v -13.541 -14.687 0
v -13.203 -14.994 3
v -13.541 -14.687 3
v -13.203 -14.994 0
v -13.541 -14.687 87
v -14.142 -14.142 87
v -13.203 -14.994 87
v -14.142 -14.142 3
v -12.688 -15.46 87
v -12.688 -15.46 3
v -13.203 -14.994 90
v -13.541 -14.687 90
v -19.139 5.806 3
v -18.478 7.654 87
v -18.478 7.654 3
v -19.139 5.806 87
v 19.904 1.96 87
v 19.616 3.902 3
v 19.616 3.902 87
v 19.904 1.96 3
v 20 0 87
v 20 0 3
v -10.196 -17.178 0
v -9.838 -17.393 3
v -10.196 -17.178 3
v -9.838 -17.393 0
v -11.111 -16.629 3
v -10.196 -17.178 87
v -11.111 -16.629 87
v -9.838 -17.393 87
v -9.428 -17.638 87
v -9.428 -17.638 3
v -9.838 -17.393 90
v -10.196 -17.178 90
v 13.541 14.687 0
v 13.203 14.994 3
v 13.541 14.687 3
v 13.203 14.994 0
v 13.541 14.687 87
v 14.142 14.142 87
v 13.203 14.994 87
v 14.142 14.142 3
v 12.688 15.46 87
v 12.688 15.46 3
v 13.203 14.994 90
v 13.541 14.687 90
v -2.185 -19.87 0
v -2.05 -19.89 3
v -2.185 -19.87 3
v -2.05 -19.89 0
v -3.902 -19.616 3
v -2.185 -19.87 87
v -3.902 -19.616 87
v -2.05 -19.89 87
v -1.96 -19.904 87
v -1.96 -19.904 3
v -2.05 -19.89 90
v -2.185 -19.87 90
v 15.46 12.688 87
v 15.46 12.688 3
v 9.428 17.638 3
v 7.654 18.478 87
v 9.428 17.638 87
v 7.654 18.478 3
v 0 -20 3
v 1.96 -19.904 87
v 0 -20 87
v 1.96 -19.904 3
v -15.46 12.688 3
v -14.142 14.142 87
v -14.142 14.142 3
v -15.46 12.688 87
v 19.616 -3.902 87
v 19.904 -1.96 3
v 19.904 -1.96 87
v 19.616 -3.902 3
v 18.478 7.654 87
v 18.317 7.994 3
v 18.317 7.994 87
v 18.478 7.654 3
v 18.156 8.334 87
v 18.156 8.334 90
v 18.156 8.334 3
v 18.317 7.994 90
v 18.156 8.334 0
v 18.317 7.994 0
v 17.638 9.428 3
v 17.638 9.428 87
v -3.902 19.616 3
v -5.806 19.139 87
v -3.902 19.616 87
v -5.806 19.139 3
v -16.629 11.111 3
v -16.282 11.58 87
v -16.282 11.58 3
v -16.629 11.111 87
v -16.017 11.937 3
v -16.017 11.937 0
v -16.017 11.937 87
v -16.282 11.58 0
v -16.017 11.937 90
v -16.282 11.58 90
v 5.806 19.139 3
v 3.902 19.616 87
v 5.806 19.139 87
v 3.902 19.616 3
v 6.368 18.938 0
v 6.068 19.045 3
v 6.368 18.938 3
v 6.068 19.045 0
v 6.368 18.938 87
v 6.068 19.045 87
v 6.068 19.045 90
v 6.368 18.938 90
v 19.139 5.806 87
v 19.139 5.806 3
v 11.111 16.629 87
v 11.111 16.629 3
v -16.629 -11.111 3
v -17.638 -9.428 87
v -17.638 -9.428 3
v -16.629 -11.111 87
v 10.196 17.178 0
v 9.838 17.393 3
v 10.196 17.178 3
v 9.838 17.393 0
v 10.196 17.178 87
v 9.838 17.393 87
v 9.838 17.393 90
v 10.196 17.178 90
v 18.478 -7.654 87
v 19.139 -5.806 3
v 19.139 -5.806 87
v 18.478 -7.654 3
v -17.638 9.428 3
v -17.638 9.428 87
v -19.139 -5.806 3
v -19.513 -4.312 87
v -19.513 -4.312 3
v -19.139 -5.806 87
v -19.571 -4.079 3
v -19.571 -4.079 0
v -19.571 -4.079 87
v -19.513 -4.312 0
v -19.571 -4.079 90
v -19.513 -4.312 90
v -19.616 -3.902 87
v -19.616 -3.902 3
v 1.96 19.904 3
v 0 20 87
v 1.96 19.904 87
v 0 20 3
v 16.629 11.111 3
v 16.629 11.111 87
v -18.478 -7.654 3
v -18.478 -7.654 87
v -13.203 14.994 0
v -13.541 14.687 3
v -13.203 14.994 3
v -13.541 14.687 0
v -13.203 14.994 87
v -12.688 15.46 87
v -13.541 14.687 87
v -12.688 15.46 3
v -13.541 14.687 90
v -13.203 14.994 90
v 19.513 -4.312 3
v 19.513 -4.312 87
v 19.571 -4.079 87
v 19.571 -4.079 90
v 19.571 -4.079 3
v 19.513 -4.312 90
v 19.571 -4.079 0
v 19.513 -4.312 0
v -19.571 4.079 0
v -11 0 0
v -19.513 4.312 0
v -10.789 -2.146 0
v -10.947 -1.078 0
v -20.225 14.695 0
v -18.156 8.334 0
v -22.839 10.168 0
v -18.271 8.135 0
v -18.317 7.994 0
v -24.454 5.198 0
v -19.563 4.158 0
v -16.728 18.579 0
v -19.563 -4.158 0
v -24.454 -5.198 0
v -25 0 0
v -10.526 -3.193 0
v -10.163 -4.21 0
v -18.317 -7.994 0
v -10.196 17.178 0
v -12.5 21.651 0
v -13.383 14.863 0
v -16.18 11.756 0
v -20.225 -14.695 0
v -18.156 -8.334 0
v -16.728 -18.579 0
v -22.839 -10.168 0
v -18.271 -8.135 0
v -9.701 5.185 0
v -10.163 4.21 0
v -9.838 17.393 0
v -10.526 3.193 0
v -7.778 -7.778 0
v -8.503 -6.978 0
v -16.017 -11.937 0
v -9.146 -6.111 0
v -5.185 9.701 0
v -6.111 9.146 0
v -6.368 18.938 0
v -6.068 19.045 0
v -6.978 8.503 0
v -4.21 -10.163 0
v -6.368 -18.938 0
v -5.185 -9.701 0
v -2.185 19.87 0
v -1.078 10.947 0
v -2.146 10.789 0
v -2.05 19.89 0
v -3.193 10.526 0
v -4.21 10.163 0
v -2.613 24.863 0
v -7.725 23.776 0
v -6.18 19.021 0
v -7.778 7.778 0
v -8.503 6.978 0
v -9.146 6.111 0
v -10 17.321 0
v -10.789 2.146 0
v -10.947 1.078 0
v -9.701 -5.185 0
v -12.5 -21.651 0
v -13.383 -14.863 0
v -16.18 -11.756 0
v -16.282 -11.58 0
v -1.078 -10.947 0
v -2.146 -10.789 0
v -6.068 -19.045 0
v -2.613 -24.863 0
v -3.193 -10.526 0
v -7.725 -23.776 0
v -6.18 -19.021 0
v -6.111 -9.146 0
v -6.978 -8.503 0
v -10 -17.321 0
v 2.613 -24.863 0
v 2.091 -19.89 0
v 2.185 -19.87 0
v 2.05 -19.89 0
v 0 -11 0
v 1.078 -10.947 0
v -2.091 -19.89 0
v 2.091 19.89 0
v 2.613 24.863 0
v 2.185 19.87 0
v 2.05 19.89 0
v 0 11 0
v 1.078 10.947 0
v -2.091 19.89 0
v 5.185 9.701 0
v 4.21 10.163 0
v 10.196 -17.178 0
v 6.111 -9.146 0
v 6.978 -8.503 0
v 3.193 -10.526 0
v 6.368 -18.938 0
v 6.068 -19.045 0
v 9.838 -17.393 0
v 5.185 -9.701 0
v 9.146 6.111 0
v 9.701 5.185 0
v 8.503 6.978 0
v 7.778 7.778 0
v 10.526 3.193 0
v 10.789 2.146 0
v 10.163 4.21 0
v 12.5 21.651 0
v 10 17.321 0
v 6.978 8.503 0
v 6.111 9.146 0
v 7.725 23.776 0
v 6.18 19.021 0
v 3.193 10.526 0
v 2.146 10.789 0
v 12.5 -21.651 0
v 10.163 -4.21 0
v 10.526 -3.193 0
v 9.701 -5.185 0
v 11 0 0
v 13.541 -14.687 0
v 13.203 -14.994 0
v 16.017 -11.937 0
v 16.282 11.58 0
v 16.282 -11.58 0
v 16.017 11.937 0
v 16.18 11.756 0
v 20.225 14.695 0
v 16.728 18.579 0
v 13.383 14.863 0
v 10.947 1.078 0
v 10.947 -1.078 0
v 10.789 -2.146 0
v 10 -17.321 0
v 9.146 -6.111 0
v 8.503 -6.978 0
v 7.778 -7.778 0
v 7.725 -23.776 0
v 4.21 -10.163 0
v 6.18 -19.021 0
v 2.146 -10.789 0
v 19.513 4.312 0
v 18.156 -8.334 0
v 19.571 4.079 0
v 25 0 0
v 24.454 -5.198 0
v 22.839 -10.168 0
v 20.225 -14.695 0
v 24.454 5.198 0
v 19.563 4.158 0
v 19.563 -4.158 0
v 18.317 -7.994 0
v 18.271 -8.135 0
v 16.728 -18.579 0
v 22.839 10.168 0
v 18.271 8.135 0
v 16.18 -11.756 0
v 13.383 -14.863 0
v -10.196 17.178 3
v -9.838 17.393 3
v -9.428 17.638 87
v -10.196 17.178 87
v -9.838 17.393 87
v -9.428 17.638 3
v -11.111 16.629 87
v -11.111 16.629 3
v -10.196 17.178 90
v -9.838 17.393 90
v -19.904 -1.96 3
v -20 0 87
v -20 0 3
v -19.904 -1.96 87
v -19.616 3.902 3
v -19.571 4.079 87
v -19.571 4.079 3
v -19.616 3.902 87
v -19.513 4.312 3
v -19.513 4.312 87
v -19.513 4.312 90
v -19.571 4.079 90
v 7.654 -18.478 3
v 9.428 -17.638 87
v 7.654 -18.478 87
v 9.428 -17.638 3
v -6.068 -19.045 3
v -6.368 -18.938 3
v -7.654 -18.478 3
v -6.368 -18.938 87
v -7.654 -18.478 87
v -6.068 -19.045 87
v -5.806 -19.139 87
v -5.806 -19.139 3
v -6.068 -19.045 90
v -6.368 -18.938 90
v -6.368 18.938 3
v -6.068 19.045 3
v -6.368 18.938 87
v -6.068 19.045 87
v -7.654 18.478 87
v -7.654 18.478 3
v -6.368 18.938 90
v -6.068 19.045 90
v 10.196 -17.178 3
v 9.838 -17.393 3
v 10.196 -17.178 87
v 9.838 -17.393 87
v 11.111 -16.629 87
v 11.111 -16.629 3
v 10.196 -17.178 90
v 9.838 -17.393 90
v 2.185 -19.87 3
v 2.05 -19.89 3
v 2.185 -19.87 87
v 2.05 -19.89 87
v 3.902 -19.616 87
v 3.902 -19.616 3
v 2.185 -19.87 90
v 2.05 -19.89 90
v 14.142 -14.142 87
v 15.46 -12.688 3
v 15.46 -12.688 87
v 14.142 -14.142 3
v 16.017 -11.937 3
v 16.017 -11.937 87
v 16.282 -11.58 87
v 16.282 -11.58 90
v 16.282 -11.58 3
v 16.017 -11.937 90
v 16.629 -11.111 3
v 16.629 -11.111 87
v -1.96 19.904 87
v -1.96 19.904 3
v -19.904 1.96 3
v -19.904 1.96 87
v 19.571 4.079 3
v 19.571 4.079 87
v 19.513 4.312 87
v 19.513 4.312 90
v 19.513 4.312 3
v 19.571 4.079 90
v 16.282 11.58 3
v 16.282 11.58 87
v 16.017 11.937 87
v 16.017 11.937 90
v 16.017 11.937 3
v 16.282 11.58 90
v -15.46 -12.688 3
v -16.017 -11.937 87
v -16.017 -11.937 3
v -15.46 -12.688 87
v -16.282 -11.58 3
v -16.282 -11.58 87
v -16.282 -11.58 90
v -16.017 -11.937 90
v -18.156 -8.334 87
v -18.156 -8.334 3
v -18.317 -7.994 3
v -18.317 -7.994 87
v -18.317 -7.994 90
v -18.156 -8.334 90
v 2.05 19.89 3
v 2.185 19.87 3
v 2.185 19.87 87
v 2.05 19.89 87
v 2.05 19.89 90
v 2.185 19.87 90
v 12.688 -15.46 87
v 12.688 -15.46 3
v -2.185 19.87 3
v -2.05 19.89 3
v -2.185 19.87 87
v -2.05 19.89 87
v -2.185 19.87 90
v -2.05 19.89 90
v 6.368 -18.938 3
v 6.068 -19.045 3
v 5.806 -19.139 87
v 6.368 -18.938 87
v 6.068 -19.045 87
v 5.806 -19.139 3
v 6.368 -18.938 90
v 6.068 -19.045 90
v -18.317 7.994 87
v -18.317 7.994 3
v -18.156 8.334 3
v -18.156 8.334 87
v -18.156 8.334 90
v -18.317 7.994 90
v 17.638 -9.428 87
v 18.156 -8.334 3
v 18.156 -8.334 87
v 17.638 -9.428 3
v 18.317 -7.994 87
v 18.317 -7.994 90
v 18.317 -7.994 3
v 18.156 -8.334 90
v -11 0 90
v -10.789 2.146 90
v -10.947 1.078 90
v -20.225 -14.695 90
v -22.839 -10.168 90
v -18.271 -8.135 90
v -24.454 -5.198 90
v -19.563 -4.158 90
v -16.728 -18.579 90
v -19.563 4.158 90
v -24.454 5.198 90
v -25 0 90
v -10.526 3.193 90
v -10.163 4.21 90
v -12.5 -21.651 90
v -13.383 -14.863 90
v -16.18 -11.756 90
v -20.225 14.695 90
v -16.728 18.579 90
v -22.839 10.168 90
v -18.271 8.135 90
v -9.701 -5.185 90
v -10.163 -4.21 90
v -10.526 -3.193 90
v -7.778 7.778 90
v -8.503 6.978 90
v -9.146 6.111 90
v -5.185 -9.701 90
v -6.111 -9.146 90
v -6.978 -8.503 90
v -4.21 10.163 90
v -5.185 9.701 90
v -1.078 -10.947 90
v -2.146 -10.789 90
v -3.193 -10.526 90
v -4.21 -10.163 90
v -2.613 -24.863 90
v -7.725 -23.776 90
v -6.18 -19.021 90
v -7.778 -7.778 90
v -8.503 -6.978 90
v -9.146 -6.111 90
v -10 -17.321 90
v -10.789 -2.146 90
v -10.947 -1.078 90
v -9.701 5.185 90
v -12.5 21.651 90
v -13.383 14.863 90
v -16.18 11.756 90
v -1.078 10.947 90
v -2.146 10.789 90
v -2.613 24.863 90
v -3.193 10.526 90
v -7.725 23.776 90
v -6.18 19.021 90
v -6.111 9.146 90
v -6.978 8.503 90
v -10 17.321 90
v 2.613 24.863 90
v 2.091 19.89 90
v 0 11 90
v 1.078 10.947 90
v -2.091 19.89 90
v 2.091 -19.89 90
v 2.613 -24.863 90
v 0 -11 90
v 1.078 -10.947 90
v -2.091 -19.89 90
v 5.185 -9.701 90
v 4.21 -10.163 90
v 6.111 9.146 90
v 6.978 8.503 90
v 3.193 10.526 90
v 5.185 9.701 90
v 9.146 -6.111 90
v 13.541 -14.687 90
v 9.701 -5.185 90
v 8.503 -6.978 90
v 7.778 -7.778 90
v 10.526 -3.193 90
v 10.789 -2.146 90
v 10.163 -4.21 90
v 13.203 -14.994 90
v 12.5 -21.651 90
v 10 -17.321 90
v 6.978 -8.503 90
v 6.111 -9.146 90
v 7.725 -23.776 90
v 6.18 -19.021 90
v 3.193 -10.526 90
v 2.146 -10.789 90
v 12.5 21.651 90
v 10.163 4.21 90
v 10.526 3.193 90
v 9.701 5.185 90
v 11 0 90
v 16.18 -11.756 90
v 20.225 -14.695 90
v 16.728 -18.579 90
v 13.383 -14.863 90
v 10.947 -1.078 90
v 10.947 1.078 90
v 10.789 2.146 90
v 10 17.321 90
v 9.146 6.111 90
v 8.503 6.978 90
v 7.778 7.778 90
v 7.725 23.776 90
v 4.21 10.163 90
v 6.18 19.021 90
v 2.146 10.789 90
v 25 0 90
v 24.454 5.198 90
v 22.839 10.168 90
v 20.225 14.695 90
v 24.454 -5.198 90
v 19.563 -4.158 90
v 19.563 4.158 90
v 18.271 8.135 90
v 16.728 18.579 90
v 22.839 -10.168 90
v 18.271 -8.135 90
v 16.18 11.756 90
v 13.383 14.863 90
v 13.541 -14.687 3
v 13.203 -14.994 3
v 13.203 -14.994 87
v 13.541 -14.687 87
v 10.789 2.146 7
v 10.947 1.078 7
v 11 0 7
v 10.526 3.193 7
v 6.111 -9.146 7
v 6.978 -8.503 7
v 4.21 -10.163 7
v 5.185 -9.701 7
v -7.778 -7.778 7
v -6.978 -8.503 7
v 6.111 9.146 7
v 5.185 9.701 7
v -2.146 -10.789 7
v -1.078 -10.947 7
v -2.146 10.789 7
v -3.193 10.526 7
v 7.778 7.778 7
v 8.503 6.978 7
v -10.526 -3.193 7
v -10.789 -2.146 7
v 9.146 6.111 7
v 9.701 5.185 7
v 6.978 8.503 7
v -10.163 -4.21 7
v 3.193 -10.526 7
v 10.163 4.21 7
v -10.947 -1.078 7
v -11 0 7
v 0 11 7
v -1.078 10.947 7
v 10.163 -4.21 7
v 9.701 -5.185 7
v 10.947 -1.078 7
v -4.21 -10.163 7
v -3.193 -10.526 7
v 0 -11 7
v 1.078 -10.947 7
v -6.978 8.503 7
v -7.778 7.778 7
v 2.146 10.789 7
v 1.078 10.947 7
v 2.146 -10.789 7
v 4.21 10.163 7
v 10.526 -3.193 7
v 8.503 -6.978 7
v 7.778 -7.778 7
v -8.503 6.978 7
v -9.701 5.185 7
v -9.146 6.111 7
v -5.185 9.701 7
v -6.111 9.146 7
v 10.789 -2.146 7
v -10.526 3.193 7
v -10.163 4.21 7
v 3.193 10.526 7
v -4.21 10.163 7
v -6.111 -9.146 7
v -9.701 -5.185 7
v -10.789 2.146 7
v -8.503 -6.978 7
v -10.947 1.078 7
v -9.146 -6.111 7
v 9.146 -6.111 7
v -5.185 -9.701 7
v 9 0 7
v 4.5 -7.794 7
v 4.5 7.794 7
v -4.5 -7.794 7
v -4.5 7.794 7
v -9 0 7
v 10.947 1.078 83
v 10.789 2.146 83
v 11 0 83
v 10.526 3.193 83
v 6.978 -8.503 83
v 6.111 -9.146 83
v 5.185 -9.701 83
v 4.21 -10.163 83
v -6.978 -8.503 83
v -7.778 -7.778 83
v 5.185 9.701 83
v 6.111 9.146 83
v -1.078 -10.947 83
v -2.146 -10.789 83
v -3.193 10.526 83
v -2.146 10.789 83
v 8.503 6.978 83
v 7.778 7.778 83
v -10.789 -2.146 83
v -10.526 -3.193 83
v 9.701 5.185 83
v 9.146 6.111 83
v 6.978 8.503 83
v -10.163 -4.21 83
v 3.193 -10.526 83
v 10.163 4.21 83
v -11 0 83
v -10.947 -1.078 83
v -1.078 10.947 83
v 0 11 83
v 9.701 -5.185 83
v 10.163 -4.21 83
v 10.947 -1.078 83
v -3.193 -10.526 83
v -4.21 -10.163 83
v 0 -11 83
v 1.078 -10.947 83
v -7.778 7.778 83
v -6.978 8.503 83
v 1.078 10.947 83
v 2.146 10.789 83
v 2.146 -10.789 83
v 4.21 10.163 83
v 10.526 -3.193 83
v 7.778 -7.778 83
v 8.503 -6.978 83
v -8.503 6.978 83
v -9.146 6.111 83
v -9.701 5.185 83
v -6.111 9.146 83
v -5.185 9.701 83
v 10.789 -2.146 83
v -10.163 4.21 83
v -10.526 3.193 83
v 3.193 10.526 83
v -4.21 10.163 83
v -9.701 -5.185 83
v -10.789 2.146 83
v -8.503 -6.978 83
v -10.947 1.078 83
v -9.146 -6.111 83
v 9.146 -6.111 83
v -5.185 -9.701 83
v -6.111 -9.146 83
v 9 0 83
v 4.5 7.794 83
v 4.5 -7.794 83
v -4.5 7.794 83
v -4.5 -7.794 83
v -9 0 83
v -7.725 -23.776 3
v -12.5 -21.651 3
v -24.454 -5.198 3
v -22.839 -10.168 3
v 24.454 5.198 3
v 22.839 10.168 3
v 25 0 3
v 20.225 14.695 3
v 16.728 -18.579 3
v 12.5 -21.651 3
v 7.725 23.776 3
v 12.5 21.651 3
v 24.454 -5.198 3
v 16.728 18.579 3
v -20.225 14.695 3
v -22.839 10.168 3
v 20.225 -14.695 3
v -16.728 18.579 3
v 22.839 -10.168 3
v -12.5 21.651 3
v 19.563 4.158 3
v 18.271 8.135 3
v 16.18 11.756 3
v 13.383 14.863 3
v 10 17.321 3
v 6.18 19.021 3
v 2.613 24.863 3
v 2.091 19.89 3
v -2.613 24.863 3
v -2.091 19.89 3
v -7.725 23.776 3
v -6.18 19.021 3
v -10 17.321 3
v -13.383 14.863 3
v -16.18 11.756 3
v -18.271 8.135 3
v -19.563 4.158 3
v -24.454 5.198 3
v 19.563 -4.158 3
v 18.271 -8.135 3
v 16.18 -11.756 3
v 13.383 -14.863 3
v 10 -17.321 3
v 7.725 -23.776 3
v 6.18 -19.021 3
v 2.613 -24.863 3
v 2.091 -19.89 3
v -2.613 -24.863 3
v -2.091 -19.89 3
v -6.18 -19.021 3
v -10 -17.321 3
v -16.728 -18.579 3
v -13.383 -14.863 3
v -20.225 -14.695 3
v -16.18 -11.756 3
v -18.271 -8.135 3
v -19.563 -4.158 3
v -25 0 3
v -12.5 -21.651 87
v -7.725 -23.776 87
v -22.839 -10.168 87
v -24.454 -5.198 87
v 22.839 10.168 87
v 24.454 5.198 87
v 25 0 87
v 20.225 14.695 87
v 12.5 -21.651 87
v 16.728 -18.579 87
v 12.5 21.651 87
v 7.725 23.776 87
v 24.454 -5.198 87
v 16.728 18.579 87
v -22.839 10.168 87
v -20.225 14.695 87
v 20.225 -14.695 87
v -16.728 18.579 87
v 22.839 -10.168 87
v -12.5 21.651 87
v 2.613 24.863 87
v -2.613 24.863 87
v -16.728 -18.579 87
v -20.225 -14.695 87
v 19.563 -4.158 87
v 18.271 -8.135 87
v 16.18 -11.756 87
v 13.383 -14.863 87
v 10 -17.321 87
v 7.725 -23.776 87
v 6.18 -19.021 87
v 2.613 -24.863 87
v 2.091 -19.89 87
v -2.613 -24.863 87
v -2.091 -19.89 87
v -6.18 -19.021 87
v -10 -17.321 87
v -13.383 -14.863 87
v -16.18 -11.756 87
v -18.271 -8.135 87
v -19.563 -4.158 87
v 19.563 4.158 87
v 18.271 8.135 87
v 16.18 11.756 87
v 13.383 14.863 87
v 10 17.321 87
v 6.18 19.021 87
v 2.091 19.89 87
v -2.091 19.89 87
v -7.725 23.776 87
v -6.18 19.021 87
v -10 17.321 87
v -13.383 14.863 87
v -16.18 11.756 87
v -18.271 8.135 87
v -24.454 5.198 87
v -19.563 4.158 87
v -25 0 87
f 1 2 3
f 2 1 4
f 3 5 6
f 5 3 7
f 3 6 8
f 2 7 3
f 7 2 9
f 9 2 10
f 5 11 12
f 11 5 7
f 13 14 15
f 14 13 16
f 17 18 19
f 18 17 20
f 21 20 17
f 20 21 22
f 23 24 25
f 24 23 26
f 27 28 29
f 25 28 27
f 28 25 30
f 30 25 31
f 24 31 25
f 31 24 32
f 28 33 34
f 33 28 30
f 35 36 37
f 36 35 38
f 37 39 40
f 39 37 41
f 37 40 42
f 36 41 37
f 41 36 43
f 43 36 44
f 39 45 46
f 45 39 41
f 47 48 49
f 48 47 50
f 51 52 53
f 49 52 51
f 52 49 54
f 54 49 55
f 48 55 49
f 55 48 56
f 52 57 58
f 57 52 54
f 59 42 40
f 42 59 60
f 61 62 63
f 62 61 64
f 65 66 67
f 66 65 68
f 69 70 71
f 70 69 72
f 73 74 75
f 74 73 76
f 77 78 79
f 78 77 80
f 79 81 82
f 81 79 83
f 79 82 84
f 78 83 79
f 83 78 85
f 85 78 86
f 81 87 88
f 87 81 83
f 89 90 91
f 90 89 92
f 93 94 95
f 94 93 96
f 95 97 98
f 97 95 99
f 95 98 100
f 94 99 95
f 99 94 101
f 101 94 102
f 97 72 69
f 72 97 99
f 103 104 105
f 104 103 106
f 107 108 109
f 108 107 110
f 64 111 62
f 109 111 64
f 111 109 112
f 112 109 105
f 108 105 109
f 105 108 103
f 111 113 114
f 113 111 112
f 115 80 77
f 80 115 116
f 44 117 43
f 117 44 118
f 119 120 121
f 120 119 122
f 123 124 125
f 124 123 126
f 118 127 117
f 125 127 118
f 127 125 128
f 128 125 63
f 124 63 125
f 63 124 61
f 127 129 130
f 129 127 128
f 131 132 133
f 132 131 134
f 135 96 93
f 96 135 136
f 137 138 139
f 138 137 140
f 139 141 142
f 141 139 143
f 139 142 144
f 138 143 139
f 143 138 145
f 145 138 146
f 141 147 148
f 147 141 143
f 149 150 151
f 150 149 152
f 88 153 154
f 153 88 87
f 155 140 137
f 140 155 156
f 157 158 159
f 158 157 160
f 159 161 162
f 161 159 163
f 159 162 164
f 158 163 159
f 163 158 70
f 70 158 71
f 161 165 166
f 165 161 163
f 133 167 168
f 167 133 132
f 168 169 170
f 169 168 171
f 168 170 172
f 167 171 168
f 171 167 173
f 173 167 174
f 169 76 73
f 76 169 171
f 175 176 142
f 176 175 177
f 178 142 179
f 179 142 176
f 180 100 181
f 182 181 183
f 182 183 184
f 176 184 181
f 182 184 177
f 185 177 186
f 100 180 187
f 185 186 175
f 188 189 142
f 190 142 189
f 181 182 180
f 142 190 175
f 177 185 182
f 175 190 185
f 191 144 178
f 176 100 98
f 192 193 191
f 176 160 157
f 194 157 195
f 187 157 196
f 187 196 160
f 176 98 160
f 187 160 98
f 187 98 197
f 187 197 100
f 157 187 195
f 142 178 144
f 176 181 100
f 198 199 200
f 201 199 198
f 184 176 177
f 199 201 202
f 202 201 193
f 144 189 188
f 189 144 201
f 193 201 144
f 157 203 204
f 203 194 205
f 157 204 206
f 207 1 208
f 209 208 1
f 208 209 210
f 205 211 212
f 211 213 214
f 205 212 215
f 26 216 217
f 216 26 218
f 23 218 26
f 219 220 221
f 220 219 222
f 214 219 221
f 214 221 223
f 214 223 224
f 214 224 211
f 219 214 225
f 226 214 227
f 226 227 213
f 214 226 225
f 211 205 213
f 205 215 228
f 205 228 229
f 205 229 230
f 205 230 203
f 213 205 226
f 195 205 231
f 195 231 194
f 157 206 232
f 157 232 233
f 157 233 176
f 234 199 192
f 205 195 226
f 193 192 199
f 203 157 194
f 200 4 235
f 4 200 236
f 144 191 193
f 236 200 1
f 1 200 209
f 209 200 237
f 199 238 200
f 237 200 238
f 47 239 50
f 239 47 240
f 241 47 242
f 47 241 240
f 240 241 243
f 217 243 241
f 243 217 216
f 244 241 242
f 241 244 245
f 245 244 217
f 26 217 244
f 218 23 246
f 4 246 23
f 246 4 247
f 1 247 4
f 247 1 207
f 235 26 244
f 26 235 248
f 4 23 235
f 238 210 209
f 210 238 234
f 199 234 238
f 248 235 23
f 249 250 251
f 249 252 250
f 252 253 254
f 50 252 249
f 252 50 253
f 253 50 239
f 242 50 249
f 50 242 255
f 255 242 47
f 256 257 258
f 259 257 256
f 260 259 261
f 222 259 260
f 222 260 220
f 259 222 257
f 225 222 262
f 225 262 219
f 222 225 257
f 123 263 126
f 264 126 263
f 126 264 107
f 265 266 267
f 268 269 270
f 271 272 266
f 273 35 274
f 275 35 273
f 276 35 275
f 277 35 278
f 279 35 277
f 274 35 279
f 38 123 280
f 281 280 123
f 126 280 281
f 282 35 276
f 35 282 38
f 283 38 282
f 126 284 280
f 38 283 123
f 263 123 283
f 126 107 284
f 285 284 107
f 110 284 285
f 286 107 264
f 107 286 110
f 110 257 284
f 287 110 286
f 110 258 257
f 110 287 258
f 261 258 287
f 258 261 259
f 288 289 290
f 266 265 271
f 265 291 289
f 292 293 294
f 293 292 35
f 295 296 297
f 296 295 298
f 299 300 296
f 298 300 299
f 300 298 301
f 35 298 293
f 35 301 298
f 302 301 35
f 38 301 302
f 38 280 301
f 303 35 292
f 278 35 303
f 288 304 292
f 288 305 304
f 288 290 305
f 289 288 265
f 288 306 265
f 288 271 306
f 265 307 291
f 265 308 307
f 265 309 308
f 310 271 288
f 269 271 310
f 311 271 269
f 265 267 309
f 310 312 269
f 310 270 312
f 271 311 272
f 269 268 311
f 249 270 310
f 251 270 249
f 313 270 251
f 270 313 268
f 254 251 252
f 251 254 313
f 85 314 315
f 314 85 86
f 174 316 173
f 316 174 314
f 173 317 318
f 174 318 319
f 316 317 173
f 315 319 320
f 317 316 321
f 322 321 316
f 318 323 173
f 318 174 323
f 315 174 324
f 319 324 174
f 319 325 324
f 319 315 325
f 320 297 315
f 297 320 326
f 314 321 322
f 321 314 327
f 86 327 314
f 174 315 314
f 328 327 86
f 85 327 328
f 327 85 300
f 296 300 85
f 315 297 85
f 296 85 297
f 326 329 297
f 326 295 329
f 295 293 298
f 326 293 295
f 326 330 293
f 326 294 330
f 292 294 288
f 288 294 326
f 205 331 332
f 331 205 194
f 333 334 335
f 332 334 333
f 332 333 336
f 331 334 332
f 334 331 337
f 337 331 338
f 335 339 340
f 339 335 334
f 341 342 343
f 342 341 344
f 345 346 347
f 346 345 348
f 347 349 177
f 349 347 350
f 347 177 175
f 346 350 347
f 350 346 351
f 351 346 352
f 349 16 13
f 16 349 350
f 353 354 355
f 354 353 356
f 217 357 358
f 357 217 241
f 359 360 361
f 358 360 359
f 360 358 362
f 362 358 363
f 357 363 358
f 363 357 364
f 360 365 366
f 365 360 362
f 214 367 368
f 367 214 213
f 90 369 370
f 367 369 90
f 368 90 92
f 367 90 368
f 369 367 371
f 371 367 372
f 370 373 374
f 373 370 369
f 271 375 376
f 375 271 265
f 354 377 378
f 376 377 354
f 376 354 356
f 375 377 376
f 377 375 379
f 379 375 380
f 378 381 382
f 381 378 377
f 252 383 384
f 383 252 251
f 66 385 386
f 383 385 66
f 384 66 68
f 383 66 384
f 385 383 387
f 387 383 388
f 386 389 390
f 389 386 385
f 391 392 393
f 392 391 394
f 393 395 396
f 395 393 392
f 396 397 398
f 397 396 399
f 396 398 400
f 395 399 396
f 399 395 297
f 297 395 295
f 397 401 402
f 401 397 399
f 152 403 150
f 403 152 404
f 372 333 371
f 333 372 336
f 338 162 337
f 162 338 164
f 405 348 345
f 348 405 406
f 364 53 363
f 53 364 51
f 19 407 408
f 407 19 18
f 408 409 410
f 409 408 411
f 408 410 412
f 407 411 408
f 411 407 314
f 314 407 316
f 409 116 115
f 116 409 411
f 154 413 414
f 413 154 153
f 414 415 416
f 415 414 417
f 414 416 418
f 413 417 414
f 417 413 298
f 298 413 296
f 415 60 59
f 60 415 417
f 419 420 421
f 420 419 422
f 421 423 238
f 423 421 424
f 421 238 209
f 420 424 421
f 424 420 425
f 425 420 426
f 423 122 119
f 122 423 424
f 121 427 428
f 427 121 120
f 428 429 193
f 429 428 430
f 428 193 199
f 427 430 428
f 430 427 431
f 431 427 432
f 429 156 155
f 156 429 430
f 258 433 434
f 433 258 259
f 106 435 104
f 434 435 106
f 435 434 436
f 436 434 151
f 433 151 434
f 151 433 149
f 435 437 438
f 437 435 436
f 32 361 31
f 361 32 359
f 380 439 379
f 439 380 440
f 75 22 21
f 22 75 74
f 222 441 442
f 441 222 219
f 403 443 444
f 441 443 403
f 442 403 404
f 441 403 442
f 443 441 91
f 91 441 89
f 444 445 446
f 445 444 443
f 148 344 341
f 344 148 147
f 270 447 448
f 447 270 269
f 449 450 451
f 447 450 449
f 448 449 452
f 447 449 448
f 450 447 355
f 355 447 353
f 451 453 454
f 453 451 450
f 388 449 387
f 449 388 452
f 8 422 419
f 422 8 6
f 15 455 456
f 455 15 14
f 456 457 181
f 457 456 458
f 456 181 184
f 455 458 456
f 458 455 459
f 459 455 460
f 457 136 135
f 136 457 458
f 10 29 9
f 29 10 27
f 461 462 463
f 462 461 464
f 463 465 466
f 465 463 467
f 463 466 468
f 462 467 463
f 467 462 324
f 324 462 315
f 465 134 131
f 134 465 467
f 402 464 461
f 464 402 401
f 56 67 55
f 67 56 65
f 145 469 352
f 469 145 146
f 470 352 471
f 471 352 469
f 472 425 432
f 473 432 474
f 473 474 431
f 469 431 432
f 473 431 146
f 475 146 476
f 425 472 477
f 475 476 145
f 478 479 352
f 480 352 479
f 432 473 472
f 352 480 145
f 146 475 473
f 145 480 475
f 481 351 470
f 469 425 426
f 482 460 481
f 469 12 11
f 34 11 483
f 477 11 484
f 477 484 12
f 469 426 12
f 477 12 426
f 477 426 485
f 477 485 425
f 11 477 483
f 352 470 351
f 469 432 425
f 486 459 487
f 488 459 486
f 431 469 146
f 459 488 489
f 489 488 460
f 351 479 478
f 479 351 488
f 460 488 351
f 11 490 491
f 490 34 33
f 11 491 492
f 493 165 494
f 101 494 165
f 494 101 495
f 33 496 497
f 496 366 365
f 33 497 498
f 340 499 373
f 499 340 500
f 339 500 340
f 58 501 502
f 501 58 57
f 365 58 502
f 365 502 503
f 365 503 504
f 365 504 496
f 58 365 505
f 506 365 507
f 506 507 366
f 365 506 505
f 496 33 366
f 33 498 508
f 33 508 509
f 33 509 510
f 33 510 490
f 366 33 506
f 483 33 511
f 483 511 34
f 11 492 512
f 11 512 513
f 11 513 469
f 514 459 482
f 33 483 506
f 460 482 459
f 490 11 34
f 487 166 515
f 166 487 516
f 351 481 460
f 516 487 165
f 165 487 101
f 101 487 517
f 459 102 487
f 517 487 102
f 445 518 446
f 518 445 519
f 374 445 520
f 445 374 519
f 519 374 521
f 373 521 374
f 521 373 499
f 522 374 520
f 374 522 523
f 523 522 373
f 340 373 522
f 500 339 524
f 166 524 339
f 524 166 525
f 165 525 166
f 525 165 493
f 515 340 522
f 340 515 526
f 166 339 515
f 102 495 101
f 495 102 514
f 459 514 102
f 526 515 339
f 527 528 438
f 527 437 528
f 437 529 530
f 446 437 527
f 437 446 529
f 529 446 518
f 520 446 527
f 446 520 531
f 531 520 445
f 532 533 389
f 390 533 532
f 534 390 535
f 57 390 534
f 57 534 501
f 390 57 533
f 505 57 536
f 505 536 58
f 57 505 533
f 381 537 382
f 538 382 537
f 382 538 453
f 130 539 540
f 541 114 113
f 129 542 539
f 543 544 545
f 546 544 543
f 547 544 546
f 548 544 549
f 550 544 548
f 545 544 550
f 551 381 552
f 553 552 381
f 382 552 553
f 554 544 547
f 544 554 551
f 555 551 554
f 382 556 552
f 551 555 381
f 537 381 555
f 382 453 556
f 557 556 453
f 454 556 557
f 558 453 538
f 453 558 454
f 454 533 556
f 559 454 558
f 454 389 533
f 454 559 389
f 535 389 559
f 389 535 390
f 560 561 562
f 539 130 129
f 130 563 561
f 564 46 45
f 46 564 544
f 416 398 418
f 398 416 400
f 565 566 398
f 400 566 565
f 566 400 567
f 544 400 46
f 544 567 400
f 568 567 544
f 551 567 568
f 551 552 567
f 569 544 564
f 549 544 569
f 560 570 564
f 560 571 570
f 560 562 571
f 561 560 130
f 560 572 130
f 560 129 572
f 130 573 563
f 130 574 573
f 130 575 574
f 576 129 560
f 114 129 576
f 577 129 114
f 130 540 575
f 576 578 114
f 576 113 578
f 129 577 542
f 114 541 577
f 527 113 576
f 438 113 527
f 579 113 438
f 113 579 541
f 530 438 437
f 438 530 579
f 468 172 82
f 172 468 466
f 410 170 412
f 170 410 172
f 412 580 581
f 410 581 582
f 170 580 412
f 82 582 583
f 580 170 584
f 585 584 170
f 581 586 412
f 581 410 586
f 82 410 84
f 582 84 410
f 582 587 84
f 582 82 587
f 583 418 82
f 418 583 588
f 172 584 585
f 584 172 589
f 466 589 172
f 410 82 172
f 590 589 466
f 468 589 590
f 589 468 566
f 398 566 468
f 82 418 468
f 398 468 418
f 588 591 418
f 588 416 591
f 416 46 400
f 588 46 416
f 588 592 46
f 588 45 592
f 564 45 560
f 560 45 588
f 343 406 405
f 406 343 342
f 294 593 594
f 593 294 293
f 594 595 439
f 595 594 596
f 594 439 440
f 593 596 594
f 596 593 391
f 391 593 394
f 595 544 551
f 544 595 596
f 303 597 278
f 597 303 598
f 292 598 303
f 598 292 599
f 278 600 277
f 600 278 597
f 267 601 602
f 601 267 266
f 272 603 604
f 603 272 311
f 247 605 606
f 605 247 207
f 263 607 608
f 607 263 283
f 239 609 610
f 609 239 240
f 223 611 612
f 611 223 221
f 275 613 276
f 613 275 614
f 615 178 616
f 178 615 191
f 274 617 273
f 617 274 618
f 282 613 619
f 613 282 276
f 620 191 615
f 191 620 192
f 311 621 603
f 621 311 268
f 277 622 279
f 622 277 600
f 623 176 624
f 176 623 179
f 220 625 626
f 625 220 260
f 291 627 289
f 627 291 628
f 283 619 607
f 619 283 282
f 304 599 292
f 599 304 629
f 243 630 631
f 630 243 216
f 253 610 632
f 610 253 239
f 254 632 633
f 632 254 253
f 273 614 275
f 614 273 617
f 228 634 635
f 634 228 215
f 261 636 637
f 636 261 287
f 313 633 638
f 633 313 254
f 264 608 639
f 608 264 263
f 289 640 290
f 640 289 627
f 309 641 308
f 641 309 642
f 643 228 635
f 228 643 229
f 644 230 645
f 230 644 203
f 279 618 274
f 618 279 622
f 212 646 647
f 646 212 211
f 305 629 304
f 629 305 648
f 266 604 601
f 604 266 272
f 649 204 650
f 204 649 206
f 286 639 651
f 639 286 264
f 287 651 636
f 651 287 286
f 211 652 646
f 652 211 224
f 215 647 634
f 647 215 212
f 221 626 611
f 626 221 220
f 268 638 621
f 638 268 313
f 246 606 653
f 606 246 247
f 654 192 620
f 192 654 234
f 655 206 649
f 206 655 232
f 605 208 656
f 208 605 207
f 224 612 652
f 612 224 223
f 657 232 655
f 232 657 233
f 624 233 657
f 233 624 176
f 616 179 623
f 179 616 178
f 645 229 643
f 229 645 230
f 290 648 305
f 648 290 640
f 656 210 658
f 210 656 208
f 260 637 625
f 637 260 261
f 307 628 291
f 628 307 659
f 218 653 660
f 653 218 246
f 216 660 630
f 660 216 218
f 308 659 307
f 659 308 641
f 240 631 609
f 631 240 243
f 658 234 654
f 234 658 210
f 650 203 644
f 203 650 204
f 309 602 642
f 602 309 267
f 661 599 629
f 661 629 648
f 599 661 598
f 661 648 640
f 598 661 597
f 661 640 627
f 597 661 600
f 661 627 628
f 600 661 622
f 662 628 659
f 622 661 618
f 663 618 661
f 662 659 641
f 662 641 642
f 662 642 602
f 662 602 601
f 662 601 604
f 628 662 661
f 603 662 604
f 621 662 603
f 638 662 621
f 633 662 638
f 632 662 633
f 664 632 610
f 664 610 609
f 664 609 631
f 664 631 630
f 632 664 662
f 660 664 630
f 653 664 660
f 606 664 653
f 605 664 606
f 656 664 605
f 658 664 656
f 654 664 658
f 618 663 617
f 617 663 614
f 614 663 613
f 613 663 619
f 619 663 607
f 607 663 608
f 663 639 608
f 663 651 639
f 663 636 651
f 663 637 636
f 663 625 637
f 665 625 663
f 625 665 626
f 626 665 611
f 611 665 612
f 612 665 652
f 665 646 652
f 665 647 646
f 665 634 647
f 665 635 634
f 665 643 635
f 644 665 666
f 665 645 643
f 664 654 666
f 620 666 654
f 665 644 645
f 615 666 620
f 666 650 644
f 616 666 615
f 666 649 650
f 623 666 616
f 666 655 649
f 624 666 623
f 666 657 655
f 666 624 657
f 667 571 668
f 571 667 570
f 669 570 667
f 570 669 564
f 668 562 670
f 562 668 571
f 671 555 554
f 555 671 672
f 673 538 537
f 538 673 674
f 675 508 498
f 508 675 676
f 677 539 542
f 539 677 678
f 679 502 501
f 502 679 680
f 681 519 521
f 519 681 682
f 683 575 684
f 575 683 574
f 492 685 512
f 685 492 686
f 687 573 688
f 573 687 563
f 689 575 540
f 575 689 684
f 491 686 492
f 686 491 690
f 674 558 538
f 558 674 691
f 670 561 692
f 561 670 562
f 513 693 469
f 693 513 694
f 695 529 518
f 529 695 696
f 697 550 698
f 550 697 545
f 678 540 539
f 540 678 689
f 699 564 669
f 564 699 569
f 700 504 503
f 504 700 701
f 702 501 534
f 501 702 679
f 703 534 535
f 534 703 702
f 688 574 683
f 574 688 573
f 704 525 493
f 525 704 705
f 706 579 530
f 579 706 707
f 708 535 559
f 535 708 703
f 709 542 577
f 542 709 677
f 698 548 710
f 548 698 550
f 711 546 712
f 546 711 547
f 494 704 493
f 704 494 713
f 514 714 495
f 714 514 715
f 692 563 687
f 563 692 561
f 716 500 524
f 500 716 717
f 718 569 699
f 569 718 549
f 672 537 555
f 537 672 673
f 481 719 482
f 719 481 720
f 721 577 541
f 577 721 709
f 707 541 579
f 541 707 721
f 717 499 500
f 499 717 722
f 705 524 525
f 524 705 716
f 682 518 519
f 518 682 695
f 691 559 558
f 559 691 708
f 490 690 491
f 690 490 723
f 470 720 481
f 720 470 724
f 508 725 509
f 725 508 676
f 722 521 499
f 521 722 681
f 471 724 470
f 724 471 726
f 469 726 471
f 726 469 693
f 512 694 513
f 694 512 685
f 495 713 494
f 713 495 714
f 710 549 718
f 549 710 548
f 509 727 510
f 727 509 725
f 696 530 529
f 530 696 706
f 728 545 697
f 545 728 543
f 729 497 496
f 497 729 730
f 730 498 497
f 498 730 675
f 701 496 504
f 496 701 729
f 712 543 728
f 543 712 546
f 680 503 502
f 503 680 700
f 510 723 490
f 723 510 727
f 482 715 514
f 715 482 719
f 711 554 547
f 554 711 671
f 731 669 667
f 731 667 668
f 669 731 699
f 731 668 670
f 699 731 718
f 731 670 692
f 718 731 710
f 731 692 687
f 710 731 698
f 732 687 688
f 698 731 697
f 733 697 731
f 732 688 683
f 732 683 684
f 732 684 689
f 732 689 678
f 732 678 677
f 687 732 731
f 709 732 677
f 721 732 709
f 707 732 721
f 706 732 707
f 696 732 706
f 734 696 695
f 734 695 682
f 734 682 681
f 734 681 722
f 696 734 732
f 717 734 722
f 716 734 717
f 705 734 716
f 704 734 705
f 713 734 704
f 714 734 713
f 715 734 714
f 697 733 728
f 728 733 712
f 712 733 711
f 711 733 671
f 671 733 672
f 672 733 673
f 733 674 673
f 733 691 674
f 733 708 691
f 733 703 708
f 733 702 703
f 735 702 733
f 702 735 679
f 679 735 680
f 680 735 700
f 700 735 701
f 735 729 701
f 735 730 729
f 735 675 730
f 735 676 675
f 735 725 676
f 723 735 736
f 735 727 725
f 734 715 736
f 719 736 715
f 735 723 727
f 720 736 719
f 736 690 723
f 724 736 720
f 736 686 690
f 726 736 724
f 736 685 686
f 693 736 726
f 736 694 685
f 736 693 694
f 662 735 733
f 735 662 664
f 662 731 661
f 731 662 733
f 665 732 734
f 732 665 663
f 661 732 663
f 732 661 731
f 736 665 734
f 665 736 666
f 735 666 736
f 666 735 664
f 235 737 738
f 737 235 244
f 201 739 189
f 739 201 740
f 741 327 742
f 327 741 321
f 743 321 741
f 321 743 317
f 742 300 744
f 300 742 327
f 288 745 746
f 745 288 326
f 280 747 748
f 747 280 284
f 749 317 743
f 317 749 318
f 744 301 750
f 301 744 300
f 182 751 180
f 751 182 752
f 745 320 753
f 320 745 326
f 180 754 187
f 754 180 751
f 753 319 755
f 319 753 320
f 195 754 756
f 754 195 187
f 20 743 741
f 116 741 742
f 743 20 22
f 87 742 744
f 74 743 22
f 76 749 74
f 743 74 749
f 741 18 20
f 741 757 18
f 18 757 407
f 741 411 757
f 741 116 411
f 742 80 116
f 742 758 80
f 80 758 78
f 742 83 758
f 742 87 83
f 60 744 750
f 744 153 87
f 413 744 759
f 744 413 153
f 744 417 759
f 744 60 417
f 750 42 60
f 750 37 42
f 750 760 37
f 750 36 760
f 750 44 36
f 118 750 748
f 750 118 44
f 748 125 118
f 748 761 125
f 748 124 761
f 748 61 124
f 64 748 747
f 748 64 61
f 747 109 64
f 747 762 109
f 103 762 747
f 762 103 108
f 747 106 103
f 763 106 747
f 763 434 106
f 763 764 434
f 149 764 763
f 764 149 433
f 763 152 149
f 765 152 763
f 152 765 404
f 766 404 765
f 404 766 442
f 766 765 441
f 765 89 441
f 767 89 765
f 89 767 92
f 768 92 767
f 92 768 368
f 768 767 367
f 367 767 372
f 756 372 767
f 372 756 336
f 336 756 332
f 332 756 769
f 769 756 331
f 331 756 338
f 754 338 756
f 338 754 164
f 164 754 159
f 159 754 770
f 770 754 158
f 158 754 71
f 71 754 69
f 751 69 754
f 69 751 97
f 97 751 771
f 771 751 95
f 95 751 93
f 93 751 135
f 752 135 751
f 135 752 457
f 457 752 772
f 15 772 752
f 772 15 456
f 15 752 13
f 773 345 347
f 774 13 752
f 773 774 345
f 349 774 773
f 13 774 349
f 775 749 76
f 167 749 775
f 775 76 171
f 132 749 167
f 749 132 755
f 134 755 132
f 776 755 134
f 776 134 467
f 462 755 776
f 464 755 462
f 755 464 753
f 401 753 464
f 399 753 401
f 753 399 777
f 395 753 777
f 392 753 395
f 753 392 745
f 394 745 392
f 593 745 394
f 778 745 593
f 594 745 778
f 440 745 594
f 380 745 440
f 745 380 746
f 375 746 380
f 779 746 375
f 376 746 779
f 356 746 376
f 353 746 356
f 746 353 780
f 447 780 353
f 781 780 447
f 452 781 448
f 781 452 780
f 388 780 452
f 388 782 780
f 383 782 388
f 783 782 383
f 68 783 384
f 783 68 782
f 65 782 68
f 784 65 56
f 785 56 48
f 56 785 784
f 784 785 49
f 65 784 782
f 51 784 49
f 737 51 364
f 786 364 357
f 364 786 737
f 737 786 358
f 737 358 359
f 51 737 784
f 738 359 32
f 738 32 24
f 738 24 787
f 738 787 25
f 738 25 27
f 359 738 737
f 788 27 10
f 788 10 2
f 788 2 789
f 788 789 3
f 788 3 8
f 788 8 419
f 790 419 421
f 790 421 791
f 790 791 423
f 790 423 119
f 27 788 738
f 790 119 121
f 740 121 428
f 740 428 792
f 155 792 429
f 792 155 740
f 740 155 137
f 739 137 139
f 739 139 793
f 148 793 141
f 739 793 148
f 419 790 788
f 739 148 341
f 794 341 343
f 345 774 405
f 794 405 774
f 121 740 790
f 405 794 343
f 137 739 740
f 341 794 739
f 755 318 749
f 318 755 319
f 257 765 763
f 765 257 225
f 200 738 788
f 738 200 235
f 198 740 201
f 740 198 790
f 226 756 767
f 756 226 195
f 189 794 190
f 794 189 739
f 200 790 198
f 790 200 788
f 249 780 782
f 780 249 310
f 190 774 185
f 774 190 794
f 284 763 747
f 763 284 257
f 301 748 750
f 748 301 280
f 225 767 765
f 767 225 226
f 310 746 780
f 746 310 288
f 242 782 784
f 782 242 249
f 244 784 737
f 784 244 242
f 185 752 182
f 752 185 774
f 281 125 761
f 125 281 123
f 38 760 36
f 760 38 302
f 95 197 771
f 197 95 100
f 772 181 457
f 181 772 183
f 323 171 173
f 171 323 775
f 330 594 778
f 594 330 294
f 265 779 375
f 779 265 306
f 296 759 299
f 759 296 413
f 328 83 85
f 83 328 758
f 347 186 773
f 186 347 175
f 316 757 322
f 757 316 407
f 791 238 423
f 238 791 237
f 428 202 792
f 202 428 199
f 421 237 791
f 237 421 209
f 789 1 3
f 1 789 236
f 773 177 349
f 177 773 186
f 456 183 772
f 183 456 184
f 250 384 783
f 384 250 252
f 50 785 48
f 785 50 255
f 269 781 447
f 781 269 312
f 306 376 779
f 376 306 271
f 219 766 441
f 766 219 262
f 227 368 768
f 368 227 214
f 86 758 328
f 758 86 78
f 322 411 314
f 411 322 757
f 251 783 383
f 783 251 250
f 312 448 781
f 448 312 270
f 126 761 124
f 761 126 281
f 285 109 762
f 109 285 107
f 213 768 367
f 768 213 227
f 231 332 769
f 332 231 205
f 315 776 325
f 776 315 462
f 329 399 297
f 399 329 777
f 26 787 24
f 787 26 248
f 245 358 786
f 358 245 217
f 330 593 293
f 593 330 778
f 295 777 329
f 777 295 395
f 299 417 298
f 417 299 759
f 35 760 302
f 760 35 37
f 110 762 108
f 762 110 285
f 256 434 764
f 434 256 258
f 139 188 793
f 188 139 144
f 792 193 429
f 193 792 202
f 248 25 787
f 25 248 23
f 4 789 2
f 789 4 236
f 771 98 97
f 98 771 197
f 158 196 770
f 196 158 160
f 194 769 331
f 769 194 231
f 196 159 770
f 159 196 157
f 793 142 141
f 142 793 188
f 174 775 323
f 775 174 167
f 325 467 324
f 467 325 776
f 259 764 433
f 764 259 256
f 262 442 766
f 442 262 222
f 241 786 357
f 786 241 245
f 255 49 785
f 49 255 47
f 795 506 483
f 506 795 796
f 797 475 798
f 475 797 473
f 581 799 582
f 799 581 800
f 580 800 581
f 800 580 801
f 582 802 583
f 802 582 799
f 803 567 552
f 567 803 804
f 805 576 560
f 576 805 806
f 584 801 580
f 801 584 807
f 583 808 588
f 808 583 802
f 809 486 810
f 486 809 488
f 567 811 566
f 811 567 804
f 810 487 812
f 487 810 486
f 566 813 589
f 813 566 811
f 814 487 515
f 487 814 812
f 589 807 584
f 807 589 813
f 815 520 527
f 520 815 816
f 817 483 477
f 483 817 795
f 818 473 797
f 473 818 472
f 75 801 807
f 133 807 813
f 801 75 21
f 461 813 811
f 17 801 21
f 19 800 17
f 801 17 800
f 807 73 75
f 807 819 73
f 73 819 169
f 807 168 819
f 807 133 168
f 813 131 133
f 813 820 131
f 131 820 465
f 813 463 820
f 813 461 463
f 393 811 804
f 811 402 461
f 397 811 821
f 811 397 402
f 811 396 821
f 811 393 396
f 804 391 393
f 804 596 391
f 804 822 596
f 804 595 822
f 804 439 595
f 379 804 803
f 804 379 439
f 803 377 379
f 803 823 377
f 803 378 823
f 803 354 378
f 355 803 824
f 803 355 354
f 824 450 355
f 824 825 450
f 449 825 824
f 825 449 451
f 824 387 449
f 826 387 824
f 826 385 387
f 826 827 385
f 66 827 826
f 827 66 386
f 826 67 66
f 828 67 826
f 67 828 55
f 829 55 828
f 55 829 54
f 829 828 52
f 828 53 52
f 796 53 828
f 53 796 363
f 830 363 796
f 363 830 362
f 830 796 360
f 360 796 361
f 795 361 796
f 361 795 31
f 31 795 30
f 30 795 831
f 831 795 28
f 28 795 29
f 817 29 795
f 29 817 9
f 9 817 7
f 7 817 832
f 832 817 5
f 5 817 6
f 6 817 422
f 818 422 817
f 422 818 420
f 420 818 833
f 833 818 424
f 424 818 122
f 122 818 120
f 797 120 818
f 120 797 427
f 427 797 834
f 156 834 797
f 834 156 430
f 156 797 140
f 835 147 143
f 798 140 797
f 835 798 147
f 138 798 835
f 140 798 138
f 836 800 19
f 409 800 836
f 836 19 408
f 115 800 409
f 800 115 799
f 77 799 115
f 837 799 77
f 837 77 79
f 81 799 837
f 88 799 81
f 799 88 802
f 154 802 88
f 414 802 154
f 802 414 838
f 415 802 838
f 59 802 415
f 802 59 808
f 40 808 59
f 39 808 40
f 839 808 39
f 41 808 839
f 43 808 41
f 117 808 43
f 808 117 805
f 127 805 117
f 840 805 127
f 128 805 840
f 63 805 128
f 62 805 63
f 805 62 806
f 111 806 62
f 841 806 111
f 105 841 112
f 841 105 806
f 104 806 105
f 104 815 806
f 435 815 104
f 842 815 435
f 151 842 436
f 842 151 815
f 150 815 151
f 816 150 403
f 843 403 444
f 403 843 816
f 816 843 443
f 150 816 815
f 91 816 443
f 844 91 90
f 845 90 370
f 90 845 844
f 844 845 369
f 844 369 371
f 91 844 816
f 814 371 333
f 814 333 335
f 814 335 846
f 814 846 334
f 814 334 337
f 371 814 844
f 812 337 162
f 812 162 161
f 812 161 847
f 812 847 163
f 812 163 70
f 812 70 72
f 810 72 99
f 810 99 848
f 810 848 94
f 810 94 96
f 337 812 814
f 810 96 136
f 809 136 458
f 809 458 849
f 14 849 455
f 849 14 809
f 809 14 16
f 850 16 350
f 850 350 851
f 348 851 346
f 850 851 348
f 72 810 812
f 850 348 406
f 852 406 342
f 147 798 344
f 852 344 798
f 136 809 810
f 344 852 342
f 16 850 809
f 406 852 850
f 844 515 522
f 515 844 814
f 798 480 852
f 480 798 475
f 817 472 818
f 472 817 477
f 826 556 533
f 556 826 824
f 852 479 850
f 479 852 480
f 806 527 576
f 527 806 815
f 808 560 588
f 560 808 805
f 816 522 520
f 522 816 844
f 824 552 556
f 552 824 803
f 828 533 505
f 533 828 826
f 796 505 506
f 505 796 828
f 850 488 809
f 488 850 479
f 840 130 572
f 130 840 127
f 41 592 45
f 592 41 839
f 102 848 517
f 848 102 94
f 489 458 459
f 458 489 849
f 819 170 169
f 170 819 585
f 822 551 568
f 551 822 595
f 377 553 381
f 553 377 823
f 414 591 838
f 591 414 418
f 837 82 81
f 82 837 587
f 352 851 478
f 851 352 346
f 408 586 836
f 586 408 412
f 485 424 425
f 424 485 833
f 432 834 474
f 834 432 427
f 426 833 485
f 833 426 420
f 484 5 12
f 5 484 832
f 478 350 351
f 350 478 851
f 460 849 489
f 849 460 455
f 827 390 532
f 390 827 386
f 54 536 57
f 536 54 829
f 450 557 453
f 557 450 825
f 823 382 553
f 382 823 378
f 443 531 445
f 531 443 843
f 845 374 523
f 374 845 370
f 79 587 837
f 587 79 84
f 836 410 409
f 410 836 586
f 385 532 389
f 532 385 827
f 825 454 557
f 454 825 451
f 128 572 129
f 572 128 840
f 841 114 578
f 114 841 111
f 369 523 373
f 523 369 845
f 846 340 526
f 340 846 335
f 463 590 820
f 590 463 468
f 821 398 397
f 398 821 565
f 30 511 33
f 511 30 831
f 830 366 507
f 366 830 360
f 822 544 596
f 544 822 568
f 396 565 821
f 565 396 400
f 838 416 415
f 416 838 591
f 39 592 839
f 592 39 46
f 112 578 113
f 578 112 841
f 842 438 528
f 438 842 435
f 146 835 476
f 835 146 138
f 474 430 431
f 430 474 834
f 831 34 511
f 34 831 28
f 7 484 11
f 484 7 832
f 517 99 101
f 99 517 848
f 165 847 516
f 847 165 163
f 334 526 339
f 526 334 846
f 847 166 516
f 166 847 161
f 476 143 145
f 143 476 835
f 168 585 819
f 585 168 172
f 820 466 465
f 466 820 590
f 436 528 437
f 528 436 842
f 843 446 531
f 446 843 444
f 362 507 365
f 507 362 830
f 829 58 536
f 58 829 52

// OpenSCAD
// 2024-09-07 adam mead
// spool holder for a 3d printer.
// uses 2x 608 bearings, 8mm threaded rod if you need to secure the bearings, or plain rod
// if you don't need to secure the bearings. For instance, bearings can't come out due to
// side supports or they are a tight fit.

// resolution of the cylinder
cylres = 64;
//resolution of the core - use 6 for a hexagon (easier to print without support if printing on side)
coreres = 6;
// Diameter of the roller
core_d = 40;
//Overall length of the roller including the end rings
core_w = 90;
// Diameter of the bearing
bearing_d = 22;
// Width of the bearing
bearing_w = 7;
// Diameter of the center hole (should be slightly less than the bearing_d)
center_hole_d = 18;
// Width of the end stops
end_w = 3;
// Diameter of the end stops
end_d = core_d+10;

module core() {
        difference() {
            cylinder(h = core_w, d = core_d, $fn = cylres);
                cylinder(h = bearing_w, d = bearing_d, $fn = cylres);
            translate([0,0,core_w-bearing_w]) 
                cylinder(h = bearing_w, d = bearing_d, $fn = cylres);
            cylinder(h = core_w, d = center_hole_d, $fn = coreres);
        }
};

module create_endring() {
    difference() {
        cylinder(h = end_w, d = end_d);
        cylinder(h = end_w, d = core_d);
    };

}


module ends() {
    create_endring();
    translate([0,0,core_w-end_w])
        create_endring();
}

color("moccasin")
    render() {
        core();
        ends();
};
